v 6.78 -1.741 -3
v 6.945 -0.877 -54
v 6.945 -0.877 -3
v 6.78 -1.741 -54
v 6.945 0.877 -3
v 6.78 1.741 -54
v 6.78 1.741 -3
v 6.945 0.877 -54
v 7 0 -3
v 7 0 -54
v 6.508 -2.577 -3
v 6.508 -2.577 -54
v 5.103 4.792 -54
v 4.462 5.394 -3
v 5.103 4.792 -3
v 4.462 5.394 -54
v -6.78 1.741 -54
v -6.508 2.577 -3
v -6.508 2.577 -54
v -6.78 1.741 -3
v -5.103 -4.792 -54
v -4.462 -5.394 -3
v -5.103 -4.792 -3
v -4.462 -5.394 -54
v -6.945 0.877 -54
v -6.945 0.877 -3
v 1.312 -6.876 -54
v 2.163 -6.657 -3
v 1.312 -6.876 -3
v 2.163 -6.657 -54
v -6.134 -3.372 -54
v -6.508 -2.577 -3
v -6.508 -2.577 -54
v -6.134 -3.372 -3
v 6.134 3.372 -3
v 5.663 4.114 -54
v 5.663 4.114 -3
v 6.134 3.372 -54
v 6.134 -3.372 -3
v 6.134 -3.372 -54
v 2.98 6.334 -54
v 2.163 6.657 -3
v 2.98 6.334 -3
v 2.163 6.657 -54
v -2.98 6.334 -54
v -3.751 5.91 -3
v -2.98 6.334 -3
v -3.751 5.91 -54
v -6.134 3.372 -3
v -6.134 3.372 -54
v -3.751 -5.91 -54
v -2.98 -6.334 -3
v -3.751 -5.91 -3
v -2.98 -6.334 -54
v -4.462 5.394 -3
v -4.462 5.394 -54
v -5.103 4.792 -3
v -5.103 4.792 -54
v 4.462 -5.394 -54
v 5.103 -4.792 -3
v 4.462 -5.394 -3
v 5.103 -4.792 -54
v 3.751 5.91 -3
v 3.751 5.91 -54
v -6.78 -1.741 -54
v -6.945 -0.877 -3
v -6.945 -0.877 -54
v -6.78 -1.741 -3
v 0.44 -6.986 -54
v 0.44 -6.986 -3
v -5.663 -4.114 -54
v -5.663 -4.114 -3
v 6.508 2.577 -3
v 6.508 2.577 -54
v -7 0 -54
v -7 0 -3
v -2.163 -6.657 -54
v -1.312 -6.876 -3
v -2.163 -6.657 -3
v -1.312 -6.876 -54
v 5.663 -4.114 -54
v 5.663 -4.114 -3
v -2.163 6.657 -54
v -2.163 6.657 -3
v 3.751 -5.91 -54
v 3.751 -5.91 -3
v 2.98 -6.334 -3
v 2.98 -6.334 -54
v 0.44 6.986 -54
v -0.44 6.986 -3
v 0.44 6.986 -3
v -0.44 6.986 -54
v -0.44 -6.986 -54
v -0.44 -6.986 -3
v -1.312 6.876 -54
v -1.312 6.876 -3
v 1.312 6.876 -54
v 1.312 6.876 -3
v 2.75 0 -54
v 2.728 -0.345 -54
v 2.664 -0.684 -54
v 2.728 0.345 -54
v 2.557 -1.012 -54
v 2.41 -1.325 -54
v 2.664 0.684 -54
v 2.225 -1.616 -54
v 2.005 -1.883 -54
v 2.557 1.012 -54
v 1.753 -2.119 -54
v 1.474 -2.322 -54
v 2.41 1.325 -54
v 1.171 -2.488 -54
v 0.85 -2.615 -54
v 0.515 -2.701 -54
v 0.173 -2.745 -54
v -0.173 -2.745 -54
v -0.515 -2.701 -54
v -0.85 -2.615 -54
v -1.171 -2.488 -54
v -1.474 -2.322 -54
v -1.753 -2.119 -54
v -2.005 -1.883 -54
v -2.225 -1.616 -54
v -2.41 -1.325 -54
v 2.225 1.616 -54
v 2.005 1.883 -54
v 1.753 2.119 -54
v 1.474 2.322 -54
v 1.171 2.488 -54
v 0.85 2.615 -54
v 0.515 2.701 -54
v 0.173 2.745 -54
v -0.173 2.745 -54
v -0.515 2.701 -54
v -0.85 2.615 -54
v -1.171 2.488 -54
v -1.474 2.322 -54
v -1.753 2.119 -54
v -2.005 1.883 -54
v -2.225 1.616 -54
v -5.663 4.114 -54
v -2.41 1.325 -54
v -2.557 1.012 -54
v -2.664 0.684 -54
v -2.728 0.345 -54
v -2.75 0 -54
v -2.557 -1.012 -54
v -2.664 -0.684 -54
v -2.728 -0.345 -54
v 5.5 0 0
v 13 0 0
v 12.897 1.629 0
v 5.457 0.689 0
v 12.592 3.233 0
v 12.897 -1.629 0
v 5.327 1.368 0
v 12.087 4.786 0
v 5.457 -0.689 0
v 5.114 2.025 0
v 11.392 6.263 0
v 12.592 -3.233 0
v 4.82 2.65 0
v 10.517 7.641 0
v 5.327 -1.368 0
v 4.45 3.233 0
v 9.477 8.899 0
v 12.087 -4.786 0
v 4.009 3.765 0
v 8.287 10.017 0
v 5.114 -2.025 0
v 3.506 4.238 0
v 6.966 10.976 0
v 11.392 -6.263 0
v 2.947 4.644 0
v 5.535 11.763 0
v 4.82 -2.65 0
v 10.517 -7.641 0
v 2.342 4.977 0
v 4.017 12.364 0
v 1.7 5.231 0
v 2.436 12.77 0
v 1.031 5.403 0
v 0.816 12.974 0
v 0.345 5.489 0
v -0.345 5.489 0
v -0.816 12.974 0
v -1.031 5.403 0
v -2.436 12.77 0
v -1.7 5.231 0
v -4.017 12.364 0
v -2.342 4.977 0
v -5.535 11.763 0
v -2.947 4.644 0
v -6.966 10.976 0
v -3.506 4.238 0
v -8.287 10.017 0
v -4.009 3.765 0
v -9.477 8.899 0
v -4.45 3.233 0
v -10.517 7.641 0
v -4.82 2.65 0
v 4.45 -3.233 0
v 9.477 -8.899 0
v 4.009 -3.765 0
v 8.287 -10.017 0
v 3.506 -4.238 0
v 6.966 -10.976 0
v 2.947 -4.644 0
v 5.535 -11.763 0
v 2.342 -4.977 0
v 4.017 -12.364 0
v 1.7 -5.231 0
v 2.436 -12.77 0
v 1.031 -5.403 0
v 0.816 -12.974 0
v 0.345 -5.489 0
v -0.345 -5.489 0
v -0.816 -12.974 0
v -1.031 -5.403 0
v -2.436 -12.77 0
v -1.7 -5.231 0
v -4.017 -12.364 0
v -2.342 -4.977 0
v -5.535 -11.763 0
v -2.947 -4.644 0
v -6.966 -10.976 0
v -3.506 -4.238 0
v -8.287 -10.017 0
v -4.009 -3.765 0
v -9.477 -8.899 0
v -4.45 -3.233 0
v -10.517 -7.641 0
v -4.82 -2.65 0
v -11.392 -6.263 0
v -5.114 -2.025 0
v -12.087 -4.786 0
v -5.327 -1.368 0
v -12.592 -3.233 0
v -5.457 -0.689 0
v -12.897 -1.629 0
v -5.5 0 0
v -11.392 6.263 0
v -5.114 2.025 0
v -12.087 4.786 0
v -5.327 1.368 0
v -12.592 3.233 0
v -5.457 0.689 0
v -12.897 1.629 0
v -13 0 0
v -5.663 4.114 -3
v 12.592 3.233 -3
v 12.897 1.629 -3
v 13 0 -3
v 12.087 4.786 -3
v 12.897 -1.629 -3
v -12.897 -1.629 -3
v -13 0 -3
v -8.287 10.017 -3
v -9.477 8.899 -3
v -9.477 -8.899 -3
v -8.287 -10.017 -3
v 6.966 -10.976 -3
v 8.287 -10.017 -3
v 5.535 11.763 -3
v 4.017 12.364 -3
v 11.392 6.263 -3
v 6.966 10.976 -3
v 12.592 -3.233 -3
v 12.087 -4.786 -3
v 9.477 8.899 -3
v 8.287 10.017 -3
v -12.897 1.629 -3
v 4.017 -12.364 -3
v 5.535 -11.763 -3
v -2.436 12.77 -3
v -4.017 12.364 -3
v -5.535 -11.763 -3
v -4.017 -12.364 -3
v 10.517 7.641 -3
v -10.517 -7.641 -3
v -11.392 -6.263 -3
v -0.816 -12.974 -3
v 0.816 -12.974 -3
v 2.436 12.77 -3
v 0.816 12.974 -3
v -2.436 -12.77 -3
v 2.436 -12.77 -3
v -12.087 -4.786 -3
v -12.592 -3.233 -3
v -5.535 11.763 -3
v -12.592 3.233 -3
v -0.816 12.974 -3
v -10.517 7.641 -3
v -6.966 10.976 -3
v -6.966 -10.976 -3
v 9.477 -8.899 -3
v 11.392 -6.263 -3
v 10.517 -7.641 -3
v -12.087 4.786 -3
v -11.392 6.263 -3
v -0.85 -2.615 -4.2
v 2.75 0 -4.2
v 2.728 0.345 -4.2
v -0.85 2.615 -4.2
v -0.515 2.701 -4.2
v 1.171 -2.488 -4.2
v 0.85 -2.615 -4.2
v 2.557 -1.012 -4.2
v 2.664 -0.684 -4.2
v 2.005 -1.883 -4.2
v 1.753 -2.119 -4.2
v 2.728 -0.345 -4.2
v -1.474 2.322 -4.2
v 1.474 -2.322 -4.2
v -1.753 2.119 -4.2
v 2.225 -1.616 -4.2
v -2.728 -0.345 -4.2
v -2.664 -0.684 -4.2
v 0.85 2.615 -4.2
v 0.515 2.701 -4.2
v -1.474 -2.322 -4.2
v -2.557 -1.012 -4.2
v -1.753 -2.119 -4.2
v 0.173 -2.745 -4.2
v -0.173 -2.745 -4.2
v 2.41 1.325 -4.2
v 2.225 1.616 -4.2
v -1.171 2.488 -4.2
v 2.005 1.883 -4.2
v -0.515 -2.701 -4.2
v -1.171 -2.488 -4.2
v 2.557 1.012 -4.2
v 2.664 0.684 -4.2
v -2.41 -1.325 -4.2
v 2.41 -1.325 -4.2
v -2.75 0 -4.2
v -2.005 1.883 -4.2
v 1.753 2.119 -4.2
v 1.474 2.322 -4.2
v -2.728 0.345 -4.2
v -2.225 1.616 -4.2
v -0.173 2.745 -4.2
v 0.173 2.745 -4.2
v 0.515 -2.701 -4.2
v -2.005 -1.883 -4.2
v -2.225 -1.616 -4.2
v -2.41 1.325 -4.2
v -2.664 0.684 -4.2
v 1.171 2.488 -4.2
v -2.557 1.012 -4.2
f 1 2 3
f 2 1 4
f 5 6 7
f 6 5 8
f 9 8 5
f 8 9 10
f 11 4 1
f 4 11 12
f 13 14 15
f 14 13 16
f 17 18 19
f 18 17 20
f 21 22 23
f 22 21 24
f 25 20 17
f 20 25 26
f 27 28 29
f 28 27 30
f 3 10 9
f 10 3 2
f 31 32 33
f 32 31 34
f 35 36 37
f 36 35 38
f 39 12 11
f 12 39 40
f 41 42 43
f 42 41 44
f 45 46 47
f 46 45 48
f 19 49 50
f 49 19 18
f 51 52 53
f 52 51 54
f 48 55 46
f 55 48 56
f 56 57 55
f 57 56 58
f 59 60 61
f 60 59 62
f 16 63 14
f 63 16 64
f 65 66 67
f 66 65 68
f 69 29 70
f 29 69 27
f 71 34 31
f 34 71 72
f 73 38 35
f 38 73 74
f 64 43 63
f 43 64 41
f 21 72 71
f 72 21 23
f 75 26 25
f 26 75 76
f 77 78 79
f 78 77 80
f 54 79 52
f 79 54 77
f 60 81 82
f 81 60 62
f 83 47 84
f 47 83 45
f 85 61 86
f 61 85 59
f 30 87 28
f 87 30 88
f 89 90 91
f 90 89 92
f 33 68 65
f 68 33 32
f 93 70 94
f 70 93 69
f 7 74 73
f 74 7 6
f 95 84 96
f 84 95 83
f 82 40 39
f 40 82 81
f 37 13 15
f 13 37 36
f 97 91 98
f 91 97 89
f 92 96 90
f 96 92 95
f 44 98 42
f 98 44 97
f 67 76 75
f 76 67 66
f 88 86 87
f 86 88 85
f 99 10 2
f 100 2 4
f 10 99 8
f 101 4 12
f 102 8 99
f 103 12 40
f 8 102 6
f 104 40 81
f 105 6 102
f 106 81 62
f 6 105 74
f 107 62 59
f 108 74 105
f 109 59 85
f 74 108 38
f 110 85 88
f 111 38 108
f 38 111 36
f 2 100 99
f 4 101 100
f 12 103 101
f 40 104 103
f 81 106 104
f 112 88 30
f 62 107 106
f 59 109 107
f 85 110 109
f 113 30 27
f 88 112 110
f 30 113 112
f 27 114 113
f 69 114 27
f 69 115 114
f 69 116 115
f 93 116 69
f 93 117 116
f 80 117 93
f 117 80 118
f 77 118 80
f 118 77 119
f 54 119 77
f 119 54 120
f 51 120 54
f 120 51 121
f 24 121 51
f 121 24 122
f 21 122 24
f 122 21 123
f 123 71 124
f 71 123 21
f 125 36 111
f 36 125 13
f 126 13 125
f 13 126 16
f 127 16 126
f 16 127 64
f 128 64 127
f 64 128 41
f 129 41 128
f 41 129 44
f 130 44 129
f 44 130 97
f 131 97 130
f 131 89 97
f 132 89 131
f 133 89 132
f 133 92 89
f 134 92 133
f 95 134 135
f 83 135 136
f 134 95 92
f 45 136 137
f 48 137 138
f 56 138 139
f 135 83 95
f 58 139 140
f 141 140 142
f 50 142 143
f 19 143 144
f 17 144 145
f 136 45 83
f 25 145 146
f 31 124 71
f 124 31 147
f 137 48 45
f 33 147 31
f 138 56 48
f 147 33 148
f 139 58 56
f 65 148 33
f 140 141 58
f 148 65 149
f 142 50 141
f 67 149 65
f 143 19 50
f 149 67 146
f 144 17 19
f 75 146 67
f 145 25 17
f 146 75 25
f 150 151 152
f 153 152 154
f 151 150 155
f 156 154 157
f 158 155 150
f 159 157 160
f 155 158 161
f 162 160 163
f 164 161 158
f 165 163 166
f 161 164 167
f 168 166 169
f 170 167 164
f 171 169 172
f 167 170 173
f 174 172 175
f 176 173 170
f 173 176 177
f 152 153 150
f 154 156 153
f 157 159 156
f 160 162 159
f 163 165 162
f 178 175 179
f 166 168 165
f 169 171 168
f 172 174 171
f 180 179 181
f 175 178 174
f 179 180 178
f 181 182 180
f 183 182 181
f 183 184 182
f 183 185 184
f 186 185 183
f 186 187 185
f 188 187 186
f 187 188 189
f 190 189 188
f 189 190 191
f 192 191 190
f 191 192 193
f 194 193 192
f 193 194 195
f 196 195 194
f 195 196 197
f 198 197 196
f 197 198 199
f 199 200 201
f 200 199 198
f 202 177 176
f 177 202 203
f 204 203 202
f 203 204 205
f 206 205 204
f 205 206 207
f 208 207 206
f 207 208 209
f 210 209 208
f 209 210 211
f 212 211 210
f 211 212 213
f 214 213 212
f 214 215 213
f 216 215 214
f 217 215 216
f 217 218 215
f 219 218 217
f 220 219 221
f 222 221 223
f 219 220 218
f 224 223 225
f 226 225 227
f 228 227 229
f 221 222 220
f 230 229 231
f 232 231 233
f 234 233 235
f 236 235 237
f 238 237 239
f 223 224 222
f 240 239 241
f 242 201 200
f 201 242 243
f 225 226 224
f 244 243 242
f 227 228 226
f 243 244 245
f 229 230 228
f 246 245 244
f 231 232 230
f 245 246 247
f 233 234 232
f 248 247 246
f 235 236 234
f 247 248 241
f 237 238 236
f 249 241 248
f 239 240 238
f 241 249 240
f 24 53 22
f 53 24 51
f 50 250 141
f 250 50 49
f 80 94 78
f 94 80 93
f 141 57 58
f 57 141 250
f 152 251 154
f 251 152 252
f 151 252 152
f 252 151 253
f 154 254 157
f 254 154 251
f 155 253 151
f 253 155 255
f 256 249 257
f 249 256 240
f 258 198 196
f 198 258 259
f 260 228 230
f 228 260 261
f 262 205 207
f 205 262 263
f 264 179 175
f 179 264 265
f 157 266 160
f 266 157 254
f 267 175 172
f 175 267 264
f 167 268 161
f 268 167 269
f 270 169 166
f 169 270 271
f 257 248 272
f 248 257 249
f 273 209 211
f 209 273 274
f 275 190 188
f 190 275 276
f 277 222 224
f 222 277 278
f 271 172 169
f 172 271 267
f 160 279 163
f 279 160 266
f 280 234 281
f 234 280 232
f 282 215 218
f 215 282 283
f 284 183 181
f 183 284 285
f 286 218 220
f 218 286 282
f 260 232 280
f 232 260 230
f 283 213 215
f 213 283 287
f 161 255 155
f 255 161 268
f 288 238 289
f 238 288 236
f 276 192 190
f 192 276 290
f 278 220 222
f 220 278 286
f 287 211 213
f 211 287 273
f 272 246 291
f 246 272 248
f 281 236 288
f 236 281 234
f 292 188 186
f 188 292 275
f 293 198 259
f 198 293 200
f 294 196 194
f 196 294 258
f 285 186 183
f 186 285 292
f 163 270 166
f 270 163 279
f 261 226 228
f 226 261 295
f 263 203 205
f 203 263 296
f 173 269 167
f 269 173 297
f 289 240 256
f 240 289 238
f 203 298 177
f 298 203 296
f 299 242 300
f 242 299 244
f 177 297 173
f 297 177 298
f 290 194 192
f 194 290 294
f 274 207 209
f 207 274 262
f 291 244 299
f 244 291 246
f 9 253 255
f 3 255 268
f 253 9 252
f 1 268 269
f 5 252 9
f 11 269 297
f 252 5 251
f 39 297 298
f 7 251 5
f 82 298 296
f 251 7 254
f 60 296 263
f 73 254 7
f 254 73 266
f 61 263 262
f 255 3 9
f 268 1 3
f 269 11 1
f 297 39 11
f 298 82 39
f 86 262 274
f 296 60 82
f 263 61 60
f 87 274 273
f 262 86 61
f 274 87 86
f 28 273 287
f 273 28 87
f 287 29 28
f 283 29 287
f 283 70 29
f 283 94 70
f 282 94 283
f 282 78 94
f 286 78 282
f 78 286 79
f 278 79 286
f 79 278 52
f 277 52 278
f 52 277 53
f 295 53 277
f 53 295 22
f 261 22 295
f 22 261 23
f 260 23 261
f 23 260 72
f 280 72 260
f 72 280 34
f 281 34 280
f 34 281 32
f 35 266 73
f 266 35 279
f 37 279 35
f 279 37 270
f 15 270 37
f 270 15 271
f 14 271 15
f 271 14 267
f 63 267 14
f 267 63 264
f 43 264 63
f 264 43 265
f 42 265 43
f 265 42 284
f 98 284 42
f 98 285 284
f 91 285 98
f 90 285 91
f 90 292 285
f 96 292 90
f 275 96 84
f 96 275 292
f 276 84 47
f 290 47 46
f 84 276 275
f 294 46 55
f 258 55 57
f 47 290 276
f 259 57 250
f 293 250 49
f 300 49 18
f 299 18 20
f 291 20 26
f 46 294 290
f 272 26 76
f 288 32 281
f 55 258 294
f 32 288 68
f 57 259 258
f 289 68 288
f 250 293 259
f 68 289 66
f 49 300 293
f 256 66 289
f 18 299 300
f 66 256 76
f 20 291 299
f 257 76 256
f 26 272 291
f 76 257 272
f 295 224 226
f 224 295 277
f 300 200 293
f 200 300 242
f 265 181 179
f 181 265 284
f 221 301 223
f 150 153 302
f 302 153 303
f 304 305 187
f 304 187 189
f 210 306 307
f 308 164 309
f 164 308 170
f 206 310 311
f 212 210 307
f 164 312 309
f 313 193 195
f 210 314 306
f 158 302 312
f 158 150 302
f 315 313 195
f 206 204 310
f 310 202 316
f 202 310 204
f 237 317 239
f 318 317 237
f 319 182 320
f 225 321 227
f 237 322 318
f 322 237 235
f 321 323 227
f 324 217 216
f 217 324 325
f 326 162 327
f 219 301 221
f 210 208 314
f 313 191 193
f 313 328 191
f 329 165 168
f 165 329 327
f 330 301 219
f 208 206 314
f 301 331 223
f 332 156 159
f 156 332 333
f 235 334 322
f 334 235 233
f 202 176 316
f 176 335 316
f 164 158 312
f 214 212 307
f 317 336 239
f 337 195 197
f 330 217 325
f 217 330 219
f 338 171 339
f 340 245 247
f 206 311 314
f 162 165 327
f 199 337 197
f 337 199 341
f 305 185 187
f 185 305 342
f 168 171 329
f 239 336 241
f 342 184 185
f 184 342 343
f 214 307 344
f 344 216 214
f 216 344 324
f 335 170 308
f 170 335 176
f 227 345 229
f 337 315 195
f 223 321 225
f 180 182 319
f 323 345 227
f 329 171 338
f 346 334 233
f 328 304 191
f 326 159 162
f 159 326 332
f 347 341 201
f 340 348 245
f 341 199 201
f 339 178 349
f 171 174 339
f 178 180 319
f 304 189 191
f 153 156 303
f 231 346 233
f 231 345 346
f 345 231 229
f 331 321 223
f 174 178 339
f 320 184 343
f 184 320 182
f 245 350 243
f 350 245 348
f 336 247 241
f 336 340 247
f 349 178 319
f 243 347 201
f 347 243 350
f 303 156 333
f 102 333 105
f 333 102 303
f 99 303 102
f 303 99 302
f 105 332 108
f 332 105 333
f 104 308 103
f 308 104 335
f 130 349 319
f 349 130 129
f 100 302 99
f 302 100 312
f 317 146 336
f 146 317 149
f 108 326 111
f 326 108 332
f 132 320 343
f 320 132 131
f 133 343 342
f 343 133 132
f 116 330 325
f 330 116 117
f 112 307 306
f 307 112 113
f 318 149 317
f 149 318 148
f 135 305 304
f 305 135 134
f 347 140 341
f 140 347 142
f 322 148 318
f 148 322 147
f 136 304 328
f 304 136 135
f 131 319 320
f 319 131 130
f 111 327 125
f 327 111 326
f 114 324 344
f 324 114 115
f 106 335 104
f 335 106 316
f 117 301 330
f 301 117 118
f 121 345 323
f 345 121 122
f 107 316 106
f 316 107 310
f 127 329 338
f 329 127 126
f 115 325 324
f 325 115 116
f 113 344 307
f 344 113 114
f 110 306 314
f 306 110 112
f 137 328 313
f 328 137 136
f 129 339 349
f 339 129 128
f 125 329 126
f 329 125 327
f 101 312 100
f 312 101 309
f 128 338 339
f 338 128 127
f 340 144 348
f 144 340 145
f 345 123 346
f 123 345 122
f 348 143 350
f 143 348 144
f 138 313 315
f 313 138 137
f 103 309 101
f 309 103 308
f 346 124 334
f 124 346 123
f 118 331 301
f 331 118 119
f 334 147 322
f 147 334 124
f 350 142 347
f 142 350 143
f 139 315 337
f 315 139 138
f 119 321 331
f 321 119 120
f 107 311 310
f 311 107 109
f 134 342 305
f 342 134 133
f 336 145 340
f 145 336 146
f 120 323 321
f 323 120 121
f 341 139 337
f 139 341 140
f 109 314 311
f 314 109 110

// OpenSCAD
$fn = 50;


difference() {
	union() {
		translate(v = [0, 0, -54.0000000000]) {
			cylinder(h = 54, r = 7.0000000000);
		}
		translate(v = [0, 0, -3.0000000000]) {
			cylinder(h = 3, r = 13.0000000000);
		}
	}
	union() {
		translate(v = [0, 0, 0]) {
			rotate(a = [0, 0, 0]) {
				difference() {
					union() {
						#translate(v = [0, 0, -54.0000000000]) {
							cylinder(h = 54, r = 2.2500000000);
						}
						#translate(v = [0, 0, -4.2000000000]) {
							cylinder(h = 4.2000000000, r = 7.0000000000, r1 = 2.7500000000, r2 = 5.5000000000);
						}
						#translate(v = [0, 0, -54.0000000000]) {
							cylinder(h = 54, r = 2.7500000000);
						}
						#translate(v = [0, 0, -54.0000000000]) {
							cylinder(h = 54, r = 2.2500000000);
						}
					}
					union();
				}
			}
		}
	}
}
